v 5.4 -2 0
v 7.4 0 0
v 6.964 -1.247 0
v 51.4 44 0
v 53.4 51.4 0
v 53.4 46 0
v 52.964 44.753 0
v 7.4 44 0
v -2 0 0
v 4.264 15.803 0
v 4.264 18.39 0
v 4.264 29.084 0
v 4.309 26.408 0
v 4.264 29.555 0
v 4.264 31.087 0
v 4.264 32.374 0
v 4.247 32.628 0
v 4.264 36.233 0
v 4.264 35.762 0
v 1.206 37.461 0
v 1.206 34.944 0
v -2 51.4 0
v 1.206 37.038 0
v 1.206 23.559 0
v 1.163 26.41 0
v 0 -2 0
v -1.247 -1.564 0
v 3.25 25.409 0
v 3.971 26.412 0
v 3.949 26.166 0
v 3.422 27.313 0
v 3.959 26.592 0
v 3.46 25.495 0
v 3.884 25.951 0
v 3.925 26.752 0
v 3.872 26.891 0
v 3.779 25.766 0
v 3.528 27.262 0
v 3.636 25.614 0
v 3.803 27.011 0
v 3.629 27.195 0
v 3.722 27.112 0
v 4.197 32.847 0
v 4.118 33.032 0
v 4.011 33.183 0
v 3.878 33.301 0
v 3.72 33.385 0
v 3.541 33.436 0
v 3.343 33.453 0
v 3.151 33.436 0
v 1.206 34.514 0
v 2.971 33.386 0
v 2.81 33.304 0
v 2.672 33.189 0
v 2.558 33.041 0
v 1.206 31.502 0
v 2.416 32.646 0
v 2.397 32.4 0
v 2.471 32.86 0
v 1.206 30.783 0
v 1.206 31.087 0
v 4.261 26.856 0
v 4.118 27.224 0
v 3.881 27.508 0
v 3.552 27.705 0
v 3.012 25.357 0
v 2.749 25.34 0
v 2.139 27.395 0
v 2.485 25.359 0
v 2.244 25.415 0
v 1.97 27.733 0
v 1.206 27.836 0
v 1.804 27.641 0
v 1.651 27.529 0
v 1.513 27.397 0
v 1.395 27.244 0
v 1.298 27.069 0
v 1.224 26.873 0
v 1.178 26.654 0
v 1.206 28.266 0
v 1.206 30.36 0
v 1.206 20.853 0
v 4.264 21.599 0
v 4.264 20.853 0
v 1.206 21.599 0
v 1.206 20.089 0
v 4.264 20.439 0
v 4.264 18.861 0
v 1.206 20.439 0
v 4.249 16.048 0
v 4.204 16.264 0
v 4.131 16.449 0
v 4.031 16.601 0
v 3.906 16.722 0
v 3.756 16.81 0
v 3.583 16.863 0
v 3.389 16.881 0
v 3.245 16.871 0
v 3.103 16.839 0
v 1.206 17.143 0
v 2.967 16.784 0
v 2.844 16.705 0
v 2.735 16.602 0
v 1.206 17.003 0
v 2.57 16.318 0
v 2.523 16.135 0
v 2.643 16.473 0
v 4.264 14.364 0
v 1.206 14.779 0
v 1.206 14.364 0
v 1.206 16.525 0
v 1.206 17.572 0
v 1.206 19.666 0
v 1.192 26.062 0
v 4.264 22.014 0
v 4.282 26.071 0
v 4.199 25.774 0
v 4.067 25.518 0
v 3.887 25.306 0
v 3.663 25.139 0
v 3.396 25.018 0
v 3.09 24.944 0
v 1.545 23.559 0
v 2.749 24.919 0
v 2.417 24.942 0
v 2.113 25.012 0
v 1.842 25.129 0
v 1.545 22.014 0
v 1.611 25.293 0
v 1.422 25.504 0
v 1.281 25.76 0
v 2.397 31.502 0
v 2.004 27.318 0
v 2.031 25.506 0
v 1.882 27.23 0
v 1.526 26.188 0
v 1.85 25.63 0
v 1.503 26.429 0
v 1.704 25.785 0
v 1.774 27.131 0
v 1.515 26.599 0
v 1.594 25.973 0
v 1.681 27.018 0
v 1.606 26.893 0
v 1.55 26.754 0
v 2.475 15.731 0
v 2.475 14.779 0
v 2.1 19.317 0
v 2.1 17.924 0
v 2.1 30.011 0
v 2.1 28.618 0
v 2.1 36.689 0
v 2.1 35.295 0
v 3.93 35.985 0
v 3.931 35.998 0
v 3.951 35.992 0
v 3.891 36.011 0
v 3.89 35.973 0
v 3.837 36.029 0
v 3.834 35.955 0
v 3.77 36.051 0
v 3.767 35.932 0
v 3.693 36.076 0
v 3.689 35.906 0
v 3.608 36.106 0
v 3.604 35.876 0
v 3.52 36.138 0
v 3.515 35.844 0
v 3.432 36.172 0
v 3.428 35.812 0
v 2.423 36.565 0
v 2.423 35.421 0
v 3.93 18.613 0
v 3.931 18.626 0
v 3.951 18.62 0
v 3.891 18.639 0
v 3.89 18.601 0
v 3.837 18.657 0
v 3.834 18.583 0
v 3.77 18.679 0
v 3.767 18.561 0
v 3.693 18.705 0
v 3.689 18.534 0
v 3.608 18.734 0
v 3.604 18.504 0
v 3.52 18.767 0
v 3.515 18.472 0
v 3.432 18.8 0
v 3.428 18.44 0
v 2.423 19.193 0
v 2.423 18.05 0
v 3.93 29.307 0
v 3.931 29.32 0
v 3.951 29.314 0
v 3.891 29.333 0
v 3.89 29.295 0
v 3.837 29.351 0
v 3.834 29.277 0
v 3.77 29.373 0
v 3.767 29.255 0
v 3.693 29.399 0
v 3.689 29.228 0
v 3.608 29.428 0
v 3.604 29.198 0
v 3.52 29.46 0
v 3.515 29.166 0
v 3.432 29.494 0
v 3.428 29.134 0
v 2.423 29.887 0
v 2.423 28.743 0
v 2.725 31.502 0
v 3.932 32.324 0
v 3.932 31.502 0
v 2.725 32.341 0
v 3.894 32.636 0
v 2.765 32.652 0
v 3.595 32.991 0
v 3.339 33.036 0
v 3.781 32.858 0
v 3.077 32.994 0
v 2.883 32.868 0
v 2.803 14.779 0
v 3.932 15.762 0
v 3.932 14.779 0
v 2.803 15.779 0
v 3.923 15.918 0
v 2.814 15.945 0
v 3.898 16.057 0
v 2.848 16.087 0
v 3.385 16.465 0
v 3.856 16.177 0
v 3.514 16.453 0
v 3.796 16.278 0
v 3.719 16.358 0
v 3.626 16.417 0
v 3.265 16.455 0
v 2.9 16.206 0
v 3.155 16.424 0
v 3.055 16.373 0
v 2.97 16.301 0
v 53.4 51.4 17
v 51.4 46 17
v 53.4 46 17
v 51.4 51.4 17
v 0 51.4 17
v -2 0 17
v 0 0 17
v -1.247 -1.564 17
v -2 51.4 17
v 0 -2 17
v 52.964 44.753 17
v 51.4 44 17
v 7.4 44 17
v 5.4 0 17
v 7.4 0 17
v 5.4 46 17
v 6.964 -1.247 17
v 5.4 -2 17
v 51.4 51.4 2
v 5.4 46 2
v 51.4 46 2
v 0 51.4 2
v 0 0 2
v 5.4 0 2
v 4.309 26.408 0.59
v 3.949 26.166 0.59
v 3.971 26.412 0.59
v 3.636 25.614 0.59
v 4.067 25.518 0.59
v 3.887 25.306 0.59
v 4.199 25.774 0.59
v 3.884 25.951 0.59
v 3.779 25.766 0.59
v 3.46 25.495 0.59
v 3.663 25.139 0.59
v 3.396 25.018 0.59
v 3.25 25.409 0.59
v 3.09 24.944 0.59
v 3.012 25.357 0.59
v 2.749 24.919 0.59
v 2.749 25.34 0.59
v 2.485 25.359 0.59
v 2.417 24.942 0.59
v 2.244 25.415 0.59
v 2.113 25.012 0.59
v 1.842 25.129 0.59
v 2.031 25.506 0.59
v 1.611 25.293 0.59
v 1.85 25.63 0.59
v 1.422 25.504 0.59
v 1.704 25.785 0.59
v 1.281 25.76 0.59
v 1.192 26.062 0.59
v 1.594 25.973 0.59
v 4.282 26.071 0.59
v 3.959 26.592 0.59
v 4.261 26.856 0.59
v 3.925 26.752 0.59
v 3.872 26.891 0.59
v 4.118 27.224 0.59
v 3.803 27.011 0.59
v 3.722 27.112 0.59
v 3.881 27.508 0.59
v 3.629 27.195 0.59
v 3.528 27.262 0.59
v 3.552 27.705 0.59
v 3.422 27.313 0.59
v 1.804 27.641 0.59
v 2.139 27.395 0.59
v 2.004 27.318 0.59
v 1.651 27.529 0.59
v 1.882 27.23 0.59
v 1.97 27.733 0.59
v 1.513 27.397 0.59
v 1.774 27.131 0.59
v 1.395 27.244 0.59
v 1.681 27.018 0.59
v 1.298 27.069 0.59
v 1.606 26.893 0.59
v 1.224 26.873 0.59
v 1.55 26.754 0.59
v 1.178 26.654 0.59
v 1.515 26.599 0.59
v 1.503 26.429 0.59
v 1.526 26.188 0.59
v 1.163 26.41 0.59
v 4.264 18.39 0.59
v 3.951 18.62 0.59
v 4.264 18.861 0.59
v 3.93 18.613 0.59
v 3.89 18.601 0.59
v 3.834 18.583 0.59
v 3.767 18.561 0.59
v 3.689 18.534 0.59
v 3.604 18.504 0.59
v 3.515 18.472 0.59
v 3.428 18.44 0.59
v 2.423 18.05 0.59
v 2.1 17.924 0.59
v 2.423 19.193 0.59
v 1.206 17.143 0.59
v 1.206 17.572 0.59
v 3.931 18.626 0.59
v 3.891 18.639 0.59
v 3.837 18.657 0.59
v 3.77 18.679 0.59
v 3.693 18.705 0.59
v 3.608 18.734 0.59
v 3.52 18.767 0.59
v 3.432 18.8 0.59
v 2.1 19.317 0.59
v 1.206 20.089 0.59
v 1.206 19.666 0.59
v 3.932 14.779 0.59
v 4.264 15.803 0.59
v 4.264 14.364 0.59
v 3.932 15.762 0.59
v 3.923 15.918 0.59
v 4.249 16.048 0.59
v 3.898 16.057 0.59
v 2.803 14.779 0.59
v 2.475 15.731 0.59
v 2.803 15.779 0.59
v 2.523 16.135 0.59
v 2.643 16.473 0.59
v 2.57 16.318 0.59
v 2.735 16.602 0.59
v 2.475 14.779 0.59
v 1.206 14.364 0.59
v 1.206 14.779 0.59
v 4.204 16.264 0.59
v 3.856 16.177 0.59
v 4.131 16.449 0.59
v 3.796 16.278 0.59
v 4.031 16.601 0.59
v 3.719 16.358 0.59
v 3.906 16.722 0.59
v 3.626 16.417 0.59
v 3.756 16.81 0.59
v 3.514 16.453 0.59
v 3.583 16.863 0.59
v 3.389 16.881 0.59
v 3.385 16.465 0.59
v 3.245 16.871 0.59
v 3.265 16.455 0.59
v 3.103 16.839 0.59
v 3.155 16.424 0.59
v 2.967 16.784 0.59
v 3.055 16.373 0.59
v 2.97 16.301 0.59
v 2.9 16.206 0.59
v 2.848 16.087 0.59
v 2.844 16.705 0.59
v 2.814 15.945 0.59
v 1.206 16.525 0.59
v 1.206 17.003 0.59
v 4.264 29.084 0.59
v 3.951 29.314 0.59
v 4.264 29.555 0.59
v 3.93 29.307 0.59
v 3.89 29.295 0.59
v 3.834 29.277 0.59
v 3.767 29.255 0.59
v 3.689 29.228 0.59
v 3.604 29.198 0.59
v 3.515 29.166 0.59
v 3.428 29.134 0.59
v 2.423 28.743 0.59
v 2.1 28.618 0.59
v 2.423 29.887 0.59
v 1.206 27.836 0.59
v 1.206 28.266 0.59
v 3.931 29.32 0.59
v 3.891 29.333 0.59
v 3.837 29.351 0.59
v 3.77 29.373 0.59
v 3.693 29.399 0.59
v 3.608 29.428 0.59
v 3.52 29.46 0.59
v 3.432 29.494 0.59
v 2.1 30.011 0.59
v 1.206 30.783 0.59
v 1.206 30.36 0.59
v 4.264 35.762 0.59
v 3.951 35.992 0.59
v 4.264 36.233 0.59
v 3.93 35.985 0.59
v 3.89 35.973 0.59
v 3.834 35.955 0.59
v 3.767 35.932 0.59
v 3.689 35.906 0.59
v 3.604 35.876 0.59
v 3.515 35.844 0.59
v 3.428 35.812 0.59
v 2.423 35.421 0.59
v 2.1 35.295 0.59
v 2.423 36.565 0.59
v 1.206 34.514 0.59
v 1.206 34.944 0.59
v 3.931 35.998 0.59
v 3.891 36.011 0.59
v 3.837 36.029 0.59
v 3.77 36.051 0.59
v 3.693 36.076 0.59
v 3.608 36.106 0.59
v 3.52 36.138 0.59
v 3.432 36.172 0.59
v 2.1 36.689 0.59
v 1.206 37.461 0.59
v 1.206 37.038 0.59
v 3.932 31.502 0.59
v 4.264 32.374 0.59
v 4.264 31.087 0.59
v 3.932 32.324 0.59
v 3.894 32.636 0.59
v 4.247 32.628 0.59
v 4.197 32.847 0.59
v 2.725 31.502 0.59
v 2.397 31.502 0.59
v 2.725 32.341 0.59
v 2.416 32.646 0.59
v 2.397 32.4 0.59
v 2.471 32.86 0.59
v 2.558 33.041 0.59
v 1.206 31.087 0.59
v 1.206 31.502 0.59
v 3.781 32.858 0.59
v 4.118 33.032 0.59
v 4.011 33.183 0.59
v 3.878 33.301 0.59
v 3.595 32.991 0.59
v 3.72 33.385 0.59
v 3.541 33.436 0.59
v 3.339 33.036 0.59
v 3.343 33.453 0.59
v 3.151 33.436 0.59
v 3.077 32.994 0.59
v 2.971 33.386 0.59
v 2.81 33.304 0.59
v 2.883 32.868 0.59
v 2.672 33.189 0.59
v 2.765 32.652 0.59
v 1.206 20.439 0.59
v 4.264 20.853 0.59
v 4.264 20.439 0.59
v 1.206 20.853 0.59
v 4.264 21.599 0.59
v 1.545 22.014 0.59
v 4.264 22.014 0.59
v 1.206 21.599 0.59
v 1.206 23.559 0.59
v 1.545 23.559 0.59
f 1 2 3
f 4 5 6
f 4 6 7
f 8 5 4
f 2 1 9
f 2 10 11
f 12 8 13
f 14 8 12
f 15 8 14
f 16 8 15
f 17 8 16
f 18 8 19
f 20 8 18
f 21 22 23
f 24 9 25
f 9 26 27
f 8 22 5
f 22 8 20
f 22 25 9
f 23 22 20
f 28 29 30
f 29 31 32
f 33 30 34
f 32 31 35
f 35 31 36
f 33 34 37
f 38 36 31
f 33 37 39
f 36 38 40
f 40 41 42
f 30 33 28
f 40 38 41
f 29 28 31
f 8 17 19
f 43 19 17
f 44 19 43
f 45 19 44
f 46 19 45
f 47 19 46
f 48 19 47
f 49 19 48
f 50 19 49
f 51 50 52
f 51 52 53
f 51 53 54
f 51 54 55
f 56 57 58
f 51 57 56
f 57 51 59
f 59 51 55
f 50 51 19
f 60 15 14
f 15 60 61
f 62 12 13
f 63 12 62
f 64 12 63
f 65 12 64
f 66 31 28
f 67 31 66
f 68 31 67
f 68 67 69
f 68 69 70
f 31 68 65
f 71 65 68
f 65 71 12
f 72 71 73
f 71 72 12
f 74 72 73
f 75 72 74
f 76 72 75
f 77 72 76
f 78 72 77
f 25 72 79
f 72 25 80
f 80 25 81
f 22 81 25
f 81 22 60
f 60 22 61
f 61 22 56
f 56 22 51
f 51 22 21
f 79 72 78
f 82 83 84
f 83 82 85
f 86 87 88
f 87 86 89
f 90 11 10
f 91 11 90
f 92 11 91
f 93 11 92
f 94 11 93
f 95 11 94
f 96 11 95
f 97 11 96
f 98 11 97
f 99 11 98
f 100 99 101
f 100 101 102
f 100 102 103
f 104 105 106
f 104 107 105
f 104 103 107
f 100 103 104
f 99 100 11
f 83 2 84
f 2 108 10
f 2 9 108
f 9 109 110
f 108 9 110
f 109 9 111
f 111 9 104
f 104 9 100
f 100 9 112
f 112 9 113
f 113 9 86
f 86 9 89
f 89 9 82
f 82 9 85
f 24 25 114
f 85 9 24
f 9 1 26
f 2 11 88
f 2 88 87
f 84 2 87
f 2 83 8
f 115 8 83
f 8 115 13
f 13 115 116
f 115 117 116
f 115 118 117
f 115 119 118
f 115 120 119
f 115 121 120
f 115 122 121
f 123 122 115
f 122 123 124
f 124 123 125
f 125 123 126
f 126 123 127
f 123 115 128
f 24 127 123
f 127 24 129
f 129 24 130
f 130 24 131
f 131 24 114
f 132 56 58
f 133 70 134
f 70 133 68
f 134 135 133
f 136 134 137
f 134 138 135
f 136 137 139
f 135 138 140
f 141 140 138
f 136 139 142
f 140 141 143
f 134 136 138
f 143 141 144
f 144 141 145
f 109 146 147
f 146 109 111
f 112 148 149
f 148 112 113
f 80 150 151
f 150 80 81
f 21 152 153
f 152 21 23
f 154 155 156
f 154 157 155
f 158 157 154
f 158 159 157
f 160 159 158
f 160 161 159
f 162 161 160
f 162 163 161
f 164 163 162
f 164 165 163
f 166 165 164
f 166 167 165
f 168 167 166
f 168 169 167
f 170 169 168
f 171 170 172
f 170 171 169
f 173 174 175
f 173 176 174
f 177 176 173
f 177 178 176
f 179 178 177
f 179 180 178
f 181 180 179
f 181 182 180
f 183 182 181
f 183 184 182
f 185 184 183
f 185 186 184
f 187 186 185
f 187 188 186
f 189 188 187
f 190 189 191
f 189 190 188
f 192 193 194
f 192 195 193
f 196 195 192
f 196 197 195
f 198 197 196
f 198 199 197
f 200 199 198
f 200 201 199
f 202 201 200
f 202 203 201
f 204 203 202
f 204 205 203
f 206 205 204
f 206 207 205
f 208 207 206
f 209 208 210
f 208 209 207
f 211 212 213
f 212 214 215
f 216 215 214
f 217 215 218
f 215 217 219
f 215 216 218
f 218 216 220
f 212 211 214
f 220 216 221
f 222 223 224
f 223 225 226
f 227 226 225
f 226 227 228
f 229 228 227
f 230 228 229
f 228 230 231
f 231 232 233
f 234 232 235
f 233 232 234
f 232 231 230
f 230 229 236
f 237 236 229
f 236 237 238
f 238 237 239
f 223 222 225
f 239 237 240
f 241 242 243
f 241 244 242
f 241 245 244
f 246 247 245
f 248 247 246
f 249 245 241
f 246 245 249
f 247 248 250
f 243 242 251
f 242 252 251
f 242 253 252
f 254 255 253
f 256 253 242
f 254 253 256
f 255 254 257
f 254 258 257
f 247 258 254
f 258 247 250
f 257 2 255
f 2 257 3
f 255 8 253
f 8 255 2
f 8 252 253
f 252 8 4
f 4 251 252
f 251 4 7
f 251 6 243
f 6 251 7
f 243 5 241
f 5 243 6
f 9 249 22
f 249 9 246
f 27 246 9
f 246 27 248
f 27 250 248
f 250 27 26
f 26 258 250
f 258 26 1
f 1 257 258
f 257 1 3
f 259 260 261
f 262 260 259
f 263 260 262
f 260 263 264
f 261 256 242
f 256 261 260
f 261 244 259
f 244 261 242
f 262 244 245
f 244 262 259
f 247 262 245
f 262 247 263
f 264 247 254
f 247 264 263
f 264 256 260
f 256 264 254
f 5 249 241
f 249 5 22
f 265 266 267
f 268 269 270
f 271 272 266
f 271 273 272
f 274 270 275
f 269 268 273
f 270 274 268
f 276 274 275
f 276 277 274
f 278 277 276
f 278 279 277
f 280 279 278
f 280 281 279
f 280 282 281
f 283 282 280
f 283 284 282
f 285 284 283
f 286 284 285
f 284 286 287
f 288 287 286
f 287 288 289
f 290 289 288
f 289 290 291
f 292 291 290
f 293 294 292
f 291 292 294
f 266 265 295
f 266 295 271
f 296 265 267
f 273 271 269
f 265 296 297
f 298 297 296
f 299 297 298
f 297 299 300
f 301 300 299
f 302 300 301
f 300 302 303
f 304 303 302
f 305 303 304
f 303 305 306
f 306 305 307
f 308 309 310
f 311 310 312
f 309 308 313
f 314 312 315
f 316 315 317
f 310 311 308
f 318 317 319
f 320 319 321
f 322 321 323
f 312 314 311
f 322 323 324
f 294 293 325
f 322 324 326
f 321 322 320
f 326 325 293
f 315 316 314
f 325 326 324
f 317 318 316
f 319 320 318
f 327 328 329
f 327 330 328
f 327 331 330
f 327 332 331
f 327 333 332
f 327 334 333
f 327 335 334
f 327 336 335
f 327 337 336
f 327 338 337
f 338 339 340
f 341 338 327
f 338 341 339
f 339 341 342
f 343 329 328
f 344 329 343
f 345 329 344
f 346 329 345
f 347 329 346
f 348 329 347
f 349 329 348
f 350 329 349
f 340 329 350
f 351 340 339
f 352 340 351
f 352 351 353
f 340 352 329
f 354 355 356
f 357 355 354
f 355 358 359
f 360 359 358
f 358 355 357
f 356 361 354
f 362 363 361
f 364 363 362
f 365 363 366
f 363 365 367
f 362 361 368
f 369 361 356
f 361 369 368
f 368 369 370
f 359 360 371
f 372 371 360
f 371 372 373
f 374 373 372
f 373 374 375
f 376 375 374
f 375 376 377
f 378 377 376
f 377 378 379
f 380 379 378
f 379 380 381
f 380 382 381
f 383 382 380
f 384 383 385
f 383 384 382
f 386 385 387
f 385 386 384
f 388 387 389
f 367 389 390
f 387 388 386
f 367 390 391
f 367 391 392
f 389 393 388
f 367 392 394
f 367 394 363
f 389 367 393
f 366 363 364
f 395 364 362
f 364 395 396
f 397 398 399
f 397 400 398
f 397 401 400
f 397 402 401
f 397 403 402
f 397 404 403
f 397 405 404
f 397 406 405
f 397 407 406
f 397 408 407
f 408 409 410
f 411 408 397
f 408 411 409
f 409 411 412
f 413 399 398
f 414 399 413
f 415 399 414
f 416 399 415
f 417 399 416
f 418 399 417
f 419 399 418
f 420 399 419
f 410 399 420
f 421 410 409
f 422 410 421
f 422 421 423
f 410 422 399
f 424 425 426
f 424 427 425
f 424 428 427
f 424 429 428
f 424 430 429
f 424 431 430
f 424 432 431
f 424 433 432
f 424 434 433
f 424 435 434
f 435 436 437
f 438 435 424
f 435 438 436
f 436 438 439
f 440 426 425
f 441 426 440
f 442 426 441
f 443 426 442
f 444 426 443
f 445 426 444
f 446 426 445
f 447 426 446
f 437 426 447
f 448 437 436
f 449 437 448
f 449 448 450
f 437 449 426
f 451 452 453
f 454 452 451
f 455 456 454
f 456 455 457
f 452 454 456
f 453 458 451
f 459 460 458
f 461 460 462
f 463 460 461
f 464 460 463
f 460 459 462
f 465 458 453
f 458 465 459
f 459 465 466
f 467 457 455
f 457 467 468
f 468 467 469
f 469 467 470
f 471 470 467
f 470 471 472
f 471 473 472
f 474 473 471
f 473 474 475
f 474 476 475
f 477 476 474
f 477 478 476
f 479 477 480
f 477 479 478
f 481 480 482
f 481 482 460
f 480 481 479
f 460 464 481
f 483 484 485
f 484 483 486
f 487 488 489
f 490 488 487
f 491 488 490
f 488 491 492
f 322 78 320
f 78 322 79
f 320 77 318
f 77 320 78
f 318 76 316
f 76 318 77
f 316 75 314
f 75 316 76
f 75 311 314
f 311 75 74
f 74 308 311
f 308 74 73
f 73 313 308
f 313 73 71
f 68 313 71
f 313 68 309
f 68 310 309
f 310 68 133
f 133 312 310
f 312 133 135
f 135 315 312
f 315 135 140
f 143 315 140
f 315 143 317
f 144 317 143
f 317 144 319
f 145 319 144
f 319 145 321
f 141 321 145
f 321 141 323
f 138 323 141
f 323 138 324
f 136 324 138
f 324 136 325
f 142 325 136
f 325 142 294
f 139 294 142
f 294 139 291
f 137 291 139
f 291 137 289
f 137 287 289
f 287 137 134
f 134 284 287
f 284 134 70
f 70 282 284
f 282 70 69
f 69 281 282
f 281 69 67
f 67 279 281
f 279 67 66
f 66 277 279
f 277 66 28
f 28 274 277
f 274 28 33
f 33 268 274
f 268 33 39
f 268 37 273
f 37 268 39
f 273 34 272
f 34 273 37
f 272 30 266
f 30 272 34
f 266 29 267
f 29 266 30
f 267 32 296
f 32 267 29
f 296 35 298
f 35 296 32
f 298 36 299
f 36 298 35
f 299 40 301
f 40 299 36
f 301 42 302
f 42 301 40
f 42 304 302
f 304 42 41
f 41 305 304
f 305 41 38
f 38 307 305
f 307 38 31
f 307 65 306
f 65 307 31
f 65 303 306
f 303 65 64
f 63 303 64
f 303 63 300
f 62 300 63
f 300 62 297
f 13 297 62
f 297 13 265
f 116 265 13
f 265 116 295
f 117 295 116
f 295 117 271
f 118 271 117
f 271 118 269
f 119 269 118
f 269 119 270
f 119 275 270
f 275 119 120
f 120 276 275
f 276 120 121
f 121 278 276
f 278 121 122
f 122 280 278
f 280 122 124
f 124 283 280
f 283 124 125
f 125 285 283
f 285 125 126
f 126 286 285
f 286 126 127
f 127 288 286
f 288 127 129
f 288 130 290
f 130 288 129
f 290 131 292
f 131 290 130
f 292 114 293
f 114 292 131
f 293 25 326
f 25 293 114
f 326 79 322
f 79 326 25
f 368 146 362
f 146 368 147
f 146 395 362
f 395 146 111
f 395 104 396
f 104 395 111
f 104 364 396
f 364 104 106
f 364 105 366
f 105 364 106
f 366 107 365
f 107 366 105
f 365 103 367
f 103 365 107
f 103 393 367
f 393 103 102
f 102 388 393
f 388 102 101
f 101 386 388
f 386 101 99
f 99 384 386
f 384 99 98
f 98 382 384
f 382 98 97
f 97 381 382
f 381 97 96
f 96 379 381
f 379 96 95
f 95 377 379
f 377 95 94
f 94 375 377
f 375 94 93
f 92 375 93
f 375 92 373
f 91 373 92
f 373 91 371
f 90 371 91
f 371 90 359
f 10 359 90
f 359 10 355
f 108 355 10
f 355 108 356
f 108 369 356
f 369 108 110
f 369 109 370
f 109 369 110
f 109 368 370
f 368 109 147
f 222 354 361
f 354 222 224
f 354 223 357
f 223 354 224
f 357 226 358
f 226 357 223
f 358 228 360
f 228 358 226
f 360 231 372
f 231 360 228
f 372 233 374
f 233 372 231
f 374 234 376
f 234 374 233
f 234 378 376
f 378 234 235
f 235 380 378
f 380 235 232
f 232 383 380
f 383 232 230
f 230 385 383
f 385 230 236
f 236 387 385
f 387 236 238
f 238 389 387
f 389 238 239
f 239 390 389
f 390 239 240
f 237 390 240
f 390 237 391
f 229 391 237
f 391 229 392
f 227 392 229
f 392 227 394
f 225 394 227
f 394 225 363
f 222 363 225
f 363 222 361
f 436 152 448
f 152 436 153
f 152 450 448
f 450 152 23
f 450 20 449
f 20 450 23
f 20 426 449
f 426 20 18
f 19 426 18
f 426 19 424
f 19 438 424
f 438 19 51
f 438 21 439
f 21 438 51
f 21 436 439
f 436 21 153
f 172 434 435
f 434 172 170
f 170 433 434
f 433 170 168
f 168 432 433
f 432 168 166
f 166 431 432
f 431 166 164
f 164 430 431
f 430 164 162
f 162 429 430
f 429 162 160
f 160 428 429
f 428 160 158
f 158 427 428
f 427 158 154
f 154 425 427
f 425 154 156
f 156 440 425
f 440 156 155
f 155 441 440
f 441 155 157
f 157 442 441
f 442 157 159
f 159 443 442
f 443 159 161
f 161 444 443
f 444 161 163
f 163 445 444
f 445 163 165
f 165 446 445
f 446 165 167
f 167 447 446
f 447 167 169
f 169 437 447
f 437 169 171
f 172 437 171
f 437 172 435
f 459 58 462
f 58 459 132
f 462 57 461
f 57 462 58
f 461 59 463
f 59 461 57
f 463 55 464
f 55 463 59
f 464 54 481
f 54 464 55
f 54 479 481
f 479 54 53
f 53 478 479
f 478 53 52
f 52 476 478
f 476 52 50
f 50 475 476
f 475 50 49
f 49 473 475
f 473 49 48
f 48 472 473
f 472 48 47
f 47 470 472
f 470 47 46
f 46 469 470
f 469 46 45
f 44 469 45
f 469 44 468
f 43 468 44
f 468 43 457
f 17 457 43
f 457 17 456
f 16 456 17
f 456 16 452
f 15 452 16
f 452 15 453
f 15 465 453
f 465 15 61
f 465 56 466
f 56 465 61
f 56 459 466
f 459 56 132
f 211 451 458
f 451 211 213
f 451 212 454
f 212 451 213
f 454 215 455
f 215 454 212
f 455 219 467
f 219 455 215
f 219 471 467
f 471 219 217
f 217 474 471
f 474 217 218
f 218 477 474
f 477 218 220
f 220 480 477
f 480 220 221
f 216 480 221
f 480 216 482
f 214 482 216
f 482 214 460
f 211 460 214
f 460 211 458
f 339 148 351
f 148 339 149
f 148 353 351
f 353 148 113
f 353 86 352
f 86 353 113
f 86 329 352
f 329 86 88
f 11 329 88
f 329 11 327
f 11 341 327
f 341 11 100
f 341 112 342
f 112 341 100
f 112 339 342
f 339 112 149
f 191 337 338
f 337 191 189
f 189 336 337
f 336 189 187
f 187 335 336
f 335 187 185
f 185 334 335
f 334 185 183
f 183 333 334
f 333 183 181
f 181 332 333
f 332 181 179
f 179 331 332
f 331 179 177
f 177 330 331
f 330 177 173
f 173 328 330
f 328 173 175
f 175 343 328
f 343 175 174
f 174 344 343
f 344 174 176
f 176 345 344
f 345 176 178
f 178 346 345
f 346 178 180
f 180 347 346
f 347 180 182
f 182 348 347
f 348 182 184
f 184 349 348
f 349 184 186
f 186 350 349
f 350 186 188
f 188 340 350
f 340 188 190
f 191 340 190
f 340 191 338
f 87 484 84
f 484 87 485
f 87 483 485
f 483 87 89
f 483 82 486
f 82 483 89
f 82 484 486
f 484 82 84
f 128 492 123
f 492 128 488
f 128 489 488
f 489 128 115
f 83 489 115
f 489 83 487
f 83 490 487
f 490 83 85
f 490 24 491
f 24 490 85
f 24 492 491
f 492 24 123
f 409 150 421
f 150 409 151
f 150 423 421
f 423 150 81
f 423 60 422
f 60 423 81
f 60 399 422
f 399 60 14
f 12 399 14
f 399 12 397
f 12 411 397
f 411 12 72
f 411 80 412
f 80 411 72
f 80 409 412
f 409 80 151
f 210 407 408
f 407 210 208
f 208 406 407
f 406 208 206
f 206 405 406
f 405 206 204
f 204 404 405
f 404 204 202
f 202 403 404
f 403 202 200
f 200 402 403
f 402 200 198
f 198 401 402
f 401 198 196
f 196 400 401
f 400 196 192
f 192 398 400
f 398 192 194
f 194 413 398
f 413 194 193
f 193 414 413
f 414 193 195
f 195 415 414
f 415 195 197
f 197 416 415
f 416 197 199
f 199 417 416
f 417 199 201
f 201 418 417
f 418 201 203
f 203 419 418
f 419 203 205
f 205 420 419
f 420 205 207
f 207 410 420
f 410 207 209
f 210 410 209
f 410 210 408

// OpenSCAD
// End cap for the 2 x 2 x 3/16 in angle rails. Slips onto a cut end so nothing sharp faces
// the wall gap or the cabinet. The flat leg of the angle is flush against the underside of
// the top, so the cap has NO wall on that face: it covers the end, the underside and free
// edge of the flat leg, and both faces and the bottom edge of the vertical leg.
// Three rail ends take a cap (rail B's corner end is bolted to rail A and takes none), and
// an L-section end is HANDED: the two ends of one rail need mirror-image caps. Render both:
//   openscad -D hand=1 -o rail-end-cap-A.stl rail-end-cap.scad    (rail A's far end: print 1)
//   openscad -D hand=-1 -o rail-end-cap-B.stl rail-end-cap.scad   (rail A's wall end and rail B's far end, which is the mirror of A's far end about the desk's diagonal: print 2)
// A cap that does not go on is the other hand. Print with the closed end down. PETG or ABS;
// a dab of hot glue if it is loose.

hand  = 1;
leg   = 50.8;
t     = 4.8;
slack = 0.3;   // per side
wall  = 2;
depth = 15;

// The angle seen end-on: flat leg along the top (its top face is y = leg, against the desk),
// vertical leg down the left side (x 0..t).
module L2d(l, th) { polygon([[0, 0], [th, 0], [th, l - th], [l, l - th], [l, l], [0, l]]); }

mirror([hand < 0 ? 1 : 0, 0, 0]) difference() {
    linear_extrude(depth + wall) offset(r = wall) L2d(leg + 2 * slack, t + 2 * slack);
    translate([0, 0, wall]) linear_extrude(depth + 1) L2d(leg + 2 * slack, t + 2 * slack);   // the socket
    translate([-wall - 1, leg + 2 * slack, -1]) cube([leg + 2 * wall + 4, wall + 2, depth + wall + 2]);   // open on the desk-side face
    mirror([hand < 0 ? 1 : 0, 0, 0]) translate([(t + 2 * slack) / 2, (leg + 2 * slack) / 2, -0.01]) mirror([1, 0, 0]) rotate([0, 0, 90]) linear_extrude(0.6) text(hand > 0 ? "RAIL CAP A" : "RAIL CAP B", size = 3.2, halign = "center", valign = "center");   // on the closed end, reads correctly from outside for both hands
}
